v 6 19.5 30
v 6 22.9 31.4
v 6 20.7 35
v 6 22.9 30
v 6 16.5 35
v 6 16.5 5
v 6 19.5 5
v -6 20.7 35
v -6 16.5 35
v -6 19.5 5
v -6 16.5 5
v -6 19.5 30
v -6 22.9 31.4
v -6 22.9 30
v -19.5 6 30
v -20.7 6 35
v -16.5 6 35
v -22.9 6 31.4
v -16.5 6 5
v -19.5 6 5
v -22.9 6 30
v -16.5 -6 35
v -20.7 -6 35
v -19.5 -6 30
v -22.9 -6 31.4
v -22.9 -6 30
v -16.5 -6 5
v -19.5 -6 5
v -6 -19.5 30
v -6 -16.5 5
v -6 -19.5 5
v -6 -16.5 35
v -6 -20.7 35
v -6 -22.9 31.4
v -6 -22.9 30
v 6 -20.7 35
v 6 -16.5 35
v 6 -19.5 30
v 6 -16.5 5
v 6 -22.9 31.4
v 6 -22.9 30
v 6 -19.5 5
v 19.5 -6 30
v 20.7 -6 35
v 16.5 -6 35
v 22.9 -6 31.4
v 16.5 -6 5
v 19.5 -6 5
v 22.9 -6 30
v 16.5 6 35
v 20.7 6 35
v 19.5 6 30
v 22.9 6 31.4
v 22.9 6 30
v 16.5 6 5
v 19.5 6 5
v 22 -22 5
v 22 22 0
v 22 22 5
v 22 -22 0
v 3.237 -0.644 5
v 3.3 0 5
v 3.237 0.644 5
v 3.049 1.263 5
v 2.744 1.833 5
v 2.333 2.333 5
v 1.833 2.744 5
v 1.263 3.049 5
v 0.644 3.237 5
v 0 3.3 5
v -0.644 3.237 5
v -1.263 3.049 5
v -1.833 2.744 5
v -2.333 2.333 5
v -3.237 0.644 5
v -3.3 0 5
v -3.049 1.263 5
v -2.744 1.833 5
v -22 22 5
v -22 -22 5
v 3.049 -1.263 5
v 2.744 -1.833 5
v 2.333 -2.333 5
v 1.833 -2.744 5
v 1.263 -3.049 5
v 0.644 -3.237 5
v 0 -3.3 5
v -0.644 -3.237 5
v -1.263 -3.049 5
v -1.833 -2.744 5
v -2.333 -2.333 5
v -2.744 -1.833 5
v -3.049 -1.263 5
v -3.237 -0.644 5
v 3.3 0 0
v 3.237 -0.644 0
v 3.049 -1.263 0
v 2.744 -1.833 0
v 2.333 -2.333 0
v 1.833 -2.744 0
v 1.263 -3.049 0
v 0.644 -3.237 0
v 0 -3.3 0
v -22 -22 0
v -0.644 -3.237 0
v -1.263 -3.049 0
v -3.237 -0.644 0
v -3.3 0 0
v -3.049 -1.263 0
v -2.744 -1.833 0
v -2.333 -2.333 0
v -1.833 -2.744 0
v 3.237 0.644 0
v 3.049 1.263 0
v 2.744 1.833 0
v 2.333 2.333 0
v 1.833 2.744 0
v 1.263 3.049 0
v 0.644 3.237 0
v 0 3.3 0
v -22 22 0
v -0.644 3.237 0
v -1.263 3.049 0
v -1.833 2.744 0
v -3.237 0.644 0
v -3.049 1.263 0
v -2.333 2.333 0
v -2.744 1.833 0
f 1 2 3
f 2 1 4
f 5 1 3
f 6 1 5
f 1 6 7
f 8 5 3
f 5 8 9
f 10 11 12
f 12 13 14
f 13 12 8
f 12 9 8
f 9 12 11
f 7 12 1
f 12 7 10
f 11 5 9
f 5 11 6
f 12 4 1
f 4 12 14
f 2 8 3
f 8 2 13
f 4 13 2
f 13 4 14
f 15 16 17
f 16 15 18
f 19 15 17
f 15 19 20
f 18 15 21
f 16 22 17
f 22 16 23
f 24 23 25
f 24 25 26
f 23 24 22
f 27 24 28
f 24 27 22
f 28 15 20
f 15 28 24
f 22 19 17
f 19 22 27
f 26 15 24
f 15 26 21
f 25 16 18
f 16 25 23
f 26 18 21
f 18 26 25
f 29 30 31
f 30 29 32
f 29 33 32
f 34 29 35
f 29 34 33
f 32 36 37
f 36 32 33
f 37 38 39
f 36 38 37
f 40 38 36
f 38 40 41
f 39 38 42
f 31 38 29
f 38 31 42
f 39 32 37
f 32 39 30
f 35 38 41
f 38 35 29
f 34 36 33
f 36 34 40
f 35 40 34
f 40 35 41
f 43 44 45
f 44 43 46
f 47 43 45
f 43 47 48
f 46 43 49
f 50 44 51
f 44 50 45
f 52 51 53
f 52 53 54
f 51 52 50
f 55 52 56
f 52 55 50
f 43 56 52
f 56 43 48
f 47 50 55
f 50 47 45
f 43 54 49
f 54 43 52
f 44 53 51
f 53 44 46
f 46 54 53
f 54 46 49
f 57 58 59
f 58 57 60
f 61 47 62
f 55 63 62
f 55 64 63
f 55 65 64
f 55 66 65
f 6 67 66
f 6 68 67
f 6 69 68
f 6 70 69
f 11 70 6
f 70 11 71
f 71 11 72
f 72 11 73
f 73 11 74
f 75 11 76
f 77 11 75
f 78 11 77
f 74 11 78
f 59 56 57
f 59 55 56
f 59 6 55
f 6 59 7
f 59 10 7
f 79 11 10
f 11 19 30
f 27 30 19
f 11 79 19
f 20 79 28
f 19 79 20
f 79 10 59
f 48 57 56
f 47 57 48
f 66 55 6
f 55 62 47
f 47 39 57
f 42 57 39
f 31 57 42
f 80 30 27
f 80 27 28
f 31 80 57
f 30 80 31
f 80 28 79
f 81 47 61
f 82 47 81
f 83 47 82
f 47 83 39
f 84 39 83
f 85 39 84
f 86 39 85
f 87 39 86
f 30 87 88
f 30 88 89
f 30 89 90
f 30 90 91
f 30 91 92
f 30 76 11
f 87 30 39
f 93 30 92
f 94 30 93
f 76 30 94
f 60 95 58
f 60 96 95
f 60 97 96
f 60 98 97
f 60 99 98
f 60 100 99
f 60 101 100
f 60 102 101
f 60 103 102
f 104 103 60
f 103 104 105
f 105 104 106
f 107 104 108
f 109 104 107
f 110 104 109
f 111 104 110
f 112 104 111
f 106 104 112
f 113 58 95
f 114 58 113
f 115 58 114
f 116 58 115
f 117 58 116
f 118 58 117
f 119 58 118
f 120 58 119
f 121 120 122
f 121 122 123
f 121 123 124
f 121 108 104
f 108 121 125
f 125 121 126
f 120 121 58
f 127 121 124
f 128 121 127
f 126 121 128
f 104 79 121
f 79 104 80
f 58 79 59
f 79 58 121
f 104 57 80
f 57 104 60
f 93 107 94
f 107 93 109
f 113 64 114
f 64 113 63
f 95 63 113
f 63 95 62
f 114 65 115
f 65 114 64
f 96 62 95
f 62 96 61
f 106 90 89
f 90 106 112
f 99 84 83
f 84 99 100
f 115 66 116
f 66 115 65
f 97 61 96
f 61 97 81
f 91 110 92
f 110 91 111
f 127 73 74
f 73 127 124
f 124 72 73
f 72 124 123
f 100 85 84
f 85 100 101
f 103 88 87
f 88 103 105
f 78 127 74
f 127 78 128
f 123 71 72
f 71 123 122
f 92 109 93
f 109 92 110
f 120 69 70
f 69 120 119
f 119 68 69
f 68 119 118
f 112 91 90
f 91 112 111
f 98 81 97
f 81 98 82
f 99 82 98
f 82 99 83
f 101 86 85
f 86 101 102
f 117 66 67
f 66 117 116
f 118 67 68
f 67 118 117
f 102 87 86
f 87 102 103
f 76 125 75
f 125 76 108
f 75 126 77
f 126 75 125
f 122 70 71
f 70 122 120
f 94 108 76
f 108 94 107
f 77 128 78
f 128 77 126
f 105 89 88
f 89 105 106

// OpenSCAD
$fn = 32;

// ----------------------------------------------------------------------
// Snap-fit latch: 4 arms, 30 mm tall, 3.6 mm undercut hooks
// ----------------------------------------------------------------------

// --- parameters (mm) ---
base_d = 44;              // base plate depth
base_h = 5;               // base plate thickness
span = 36;                // distance between opposite arms
arm_t = 3;                // arm thickness
arm_d = 12;               // arm width
height = 30;              // free arm length
head_len = 3.6;           // hook reach
head_h = 5;               // hook height
lead = 1.4;               // lead-in ramp thickness
bore_d = 6.6;             // base fixing bore
top_z = 35;               // height of the arm tips above the base

arms = 4;

difference() {
  union() {
    /* base plate, centred on the arm ring */
    translate([-22, -22, 0]) cube([base_d, base_d, base_h]);
    for (a = [0 : 360 / arms : 359]) rotate([0, 0, a]) {
    /* arm, sunk 0.5 mm into the base */
    translate([-arm_d / 2, span / 2 - arm_t / 2, base_h - 0.5]) cube([arm_d, arm_t, height + 0.5]);
    /* hook: a convex hull of a tall inner block and a thin outer lip
       gives a flat undercut below and a lead-in ramp on top */
    hull() {
      translate([-arm_d / 2, span / 2 + arm_t / 2 - 0.6, top_z - head_h]) cube([arm_d, lead + 0.4, head_h]);
      translate([-arm_d / 2, span / 2 + arm_t / 2 - 0.2, top_z - head_h]) cube([arm_d, head_len, lead]);
    }
    }
  }
  translate([0, 0, -2.5]) cylinder(h = base_h + 5, d = bore_d);
}
